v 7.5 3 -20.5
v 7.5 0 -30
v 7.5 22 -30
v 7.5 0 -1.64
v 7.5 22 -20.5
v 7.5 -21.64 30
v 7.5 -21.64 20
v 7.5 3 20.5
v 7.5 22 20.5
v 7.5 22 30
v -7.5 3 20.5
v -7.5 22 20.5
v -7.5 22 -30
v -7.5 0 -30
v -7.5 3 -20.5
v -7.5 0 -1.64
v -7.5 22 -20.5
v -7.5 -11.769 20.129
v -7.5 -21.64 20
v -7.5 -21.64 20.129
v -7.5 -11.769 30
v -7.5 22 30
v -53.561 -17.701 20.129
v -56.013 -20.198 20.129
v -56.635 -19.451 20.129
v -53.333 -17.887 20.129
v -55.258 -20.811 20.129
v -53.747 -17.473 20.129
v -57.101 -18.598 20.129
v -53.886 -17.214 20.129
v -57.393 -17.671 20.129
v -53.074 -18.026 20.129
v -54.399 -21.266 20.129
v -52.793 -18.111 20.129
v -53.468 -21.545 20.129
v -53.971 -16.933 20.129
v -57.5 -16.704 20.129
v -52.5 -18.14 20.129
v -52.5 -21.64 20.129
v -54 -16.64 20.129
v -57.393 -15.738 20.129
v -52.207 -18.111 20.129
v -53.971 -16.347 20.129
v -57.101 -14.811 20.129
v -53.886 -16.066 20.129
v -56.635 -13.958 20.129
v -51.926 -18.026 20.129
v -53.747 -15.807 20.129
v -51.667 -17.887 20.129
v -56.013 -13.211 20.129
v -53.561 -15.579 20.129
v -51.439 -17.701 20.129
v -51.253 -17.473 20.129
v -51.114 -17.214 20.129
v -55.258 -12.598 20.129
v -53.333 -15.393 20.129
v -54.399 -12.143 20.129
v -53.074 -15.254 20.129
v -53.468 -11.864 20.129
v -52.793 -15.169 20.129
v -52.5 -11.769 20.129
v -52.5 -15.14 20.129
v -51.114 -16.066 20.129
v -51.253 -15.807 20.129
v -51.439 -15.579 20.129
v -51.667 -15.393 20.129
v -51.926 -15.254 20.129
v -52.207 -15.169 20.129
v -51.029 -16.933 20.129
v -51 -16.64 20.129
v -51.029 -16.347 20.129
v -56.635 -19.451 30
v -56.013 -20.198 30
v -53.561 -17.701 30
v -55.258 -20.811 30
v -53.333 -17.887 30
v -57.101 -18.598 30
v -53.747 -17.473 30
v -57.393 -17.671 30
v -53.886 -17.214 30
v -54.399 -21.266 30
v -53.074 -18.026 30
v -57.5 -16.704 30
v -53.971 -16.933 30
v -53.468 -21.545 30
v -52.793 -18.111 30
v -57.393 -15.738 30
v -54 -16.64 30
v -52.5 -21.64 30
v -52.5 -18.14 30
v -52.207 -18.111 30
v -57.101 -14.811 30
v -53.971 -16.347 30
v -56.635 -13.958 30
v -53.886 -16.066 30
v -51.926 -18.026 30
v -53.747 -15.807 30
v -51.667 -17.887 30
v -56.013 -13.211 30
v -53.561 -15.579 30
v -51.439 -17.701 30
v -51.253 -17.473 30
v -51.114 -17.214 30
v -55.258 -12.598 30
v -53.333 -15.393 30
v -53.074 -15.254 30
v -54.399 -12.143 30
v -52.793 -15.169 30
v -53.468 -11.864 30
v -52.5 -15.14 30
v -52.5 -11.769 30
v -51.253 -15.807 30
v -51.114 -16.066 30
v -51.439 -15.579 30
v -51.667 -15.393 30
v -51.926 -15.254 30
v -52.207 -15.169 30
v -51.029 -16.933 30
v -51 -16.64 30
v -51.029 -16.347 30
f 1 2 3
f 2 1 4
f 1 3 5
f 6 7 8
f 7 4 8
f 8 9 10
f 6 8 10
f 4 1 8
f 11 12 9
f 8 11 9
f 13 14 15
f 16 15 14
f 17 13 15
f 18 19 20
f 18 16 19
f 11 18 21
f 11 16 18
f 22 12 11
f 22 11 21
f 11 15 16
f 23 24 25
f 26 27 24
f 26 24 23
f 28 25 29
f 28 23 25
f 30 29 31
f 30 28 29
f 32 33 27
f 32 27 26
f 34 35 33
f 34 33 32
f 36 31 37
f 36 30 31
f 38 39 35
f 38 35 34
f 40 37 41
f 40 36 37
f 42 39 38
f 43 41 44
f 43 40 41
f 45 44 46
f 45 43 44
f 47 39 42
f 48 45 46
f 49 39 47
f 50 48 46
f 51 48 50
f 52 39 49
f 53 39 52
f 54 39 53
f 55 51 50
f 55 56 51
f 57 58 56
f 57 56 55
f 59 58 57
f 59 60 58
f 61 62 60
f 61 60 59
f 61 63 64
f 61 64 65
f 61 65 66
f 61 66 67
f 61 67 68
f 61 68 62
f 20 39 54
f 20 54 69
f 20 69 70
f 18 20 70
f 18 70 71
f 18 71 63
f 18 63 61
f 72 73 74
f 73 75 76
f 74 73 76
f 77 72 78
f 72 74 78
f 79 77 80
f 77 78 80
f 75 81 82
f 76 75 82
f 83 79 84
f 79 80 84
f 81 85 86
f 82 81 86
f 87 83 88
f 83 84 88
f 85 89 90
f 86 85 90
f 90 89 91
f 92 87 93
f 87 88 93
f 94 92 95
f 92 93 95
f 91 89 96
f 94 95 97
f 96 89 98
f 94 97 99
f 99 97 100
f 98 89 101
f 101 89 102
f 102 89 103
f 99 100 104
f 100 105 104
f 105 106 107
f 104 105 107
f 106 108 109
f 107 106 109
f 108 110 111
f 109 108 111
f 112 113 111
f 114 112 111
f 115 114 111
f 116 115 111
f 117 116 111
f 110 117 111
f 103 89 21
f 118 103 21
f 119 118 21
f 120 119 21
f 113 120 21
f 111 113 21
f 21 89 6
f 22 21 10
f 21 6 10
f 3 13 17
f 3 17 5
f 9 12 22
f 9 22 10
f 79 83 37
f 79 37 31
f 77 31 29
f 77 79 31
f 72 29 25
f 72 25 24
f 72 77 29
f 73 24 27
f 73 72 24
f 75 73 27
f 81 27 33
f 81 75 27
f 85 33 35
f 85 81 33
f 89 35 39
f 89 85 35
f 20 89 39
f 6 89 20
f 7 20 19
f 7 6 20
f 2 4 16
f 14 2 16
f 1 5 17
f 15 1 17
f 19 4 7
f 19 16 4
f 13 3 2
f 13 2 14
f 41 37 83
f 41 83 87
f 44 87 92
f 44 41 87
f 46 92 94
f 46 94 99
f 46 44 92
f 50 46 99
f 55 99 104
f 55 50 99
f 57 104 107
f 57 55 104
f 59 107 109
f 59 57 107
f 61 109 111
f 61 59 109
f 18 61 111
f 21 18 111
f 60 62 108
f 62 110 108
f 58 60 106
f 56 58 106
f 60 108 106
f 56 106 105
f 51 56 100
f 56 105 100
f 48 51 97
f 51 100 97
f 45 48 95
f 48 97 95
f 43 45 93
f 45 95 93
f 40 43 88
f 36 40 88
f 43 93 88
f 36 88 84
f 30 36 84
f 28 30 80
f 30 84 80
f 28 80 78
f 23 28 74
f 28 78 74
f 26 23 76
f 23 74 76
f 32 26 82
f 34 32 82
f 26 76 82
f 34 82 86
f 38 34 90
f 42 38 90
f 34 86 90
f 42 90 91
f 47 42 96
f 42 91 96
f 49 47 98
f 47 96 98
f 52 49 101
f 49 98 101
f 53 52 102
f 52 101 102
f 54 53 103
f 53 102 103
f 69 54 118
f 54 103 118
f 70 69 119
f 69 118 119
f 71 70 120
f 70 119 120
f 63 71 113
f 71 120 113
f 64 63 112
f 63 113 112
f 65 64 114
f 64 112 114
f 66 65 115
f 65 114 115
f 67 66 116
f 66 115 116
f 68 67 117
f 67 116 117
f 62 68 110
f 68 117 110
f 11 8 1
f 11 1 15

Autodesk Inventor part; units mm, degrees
ref_plane "YZ Plane" through (0, 0, 0) normal (1, 0, 0) x (0, 1, 0)
ref_plane "XZ Plane" through (0, 0, 0) normal (0, 1, 0) x (-1, 0, 0)
ref_plane "XY Plane" through (0, 0, 0) normal (0, 0, 1) x (1, 0, 0)
sketch "Sketch1" plane through (0, 0, 0) normal (0, 1, 0) x (-1, 0, 0)
  line L0 (-7.5, -30) -> (7.5, -30)
  line L1 (7.5, -30) -> (7.5, 30)
  line L2 (7.5, 30) -> (-7.5, 30)
  line L3 (-7.5, 30) -> (-7.5, -30)
  line L4 (-7.5, -30) -> (7.5, 30) construction
  line L5 (7.5, -30) -> (-7.5, 30) construction
  point P0 (0, 0)
  dimension "d0" = 15
  dimension "d1" = 60
extrude "Extrusion1" add sketch "Sketch1" along normal blind 3
sketch "Sketch2" plane through (0, 3, 0) normal (0, 1, 0) x (1, 0, 0)
  line L0 (-7.5, 30) -> (-7.5, -30) projected
  line L1 (7.5, 20.5) -> (-7.5, 20.5)
  line L2 (-7.5, 20.5) -> (-7.5, -20.5)
  line L3 (-7.5, -20.5) -> (7.5, -20.5)
  line L4 (7.5, -20.5) -> (7.5, 20.5)
  line L5 (7.5, 20.5) -> (-7.5, -20.5) construction
  line L6 (-7.5, 20.5) -> (7.5, -20.5) construction
  line L7 (7.5, -20.5) -> (-7.5, -20.5)
  line L8 (-7.5, -20.5) -> (-7.5, -30)
  line L9 (-7.5, -30) -> (7.5, -30)
  line L10 (7.5, -30) -> (7.5, -20.5)
  line L11 (7.5, 30) -> (-7.5, 30) projected
  line L12 (7.5, 20.5) -> (-7.5, 20.5)
  line L13 (-7.5, 20.5) -> (-7.5, 30)
  line L14 (-7.5, 30) -> (7.5, 30)
  line L15 (7.5, 30) -> (7.5, 20.5)
  point P0 (0, 0)
  dimension "d4" = 41
extrude "Extrusion2" add sketch "Sketch2" along normal blind 19 contours L11 L15 L1 L0 | L3 L10 L9 L0
sketch "Sketch3" plane through (-7.5, 0, -30) normal (-1, 0, 0) x (0, 0, 1)
  line L0 (60, 0) -> (0, 0) projected
  line L1 (60, 0) -> (50, 0)
  line L2 (50, 0) -> (50, -21.64)
  line L3 (50, -21.64) -> (60, -21.64)
  line L4 (60, -21.64) -> (60, 0)
  point P0 (30, 0)
  dimension "d7" = 10
  dimension "d8" = 21.64
extrude "Extrusion3" add sketch "Sketch3" against normal blind 15
sketch "Sketch5" plane through (-7.5, 0, -30) normal (-1, 0, 0) x (0, 0, 1)
  line L0 (0, 0) -> (50, 0) projected
  line L1 (28.3595, 0) -> (50, -21.6405)
  line L2 (50, -21.64) -> (50, 0) projected
  line L3 (28.3595, 0) -> (58.9638, 0) construction
  line L4 (50, -21.6405) -> (50, 0)
  line L5 (50, 0) -> (28.3595, 0)
  point P0 (30, 0)
  dimension "d15" = 45
extrude "Extrusion5" add sketch "Sketch5" against normal blind 15
sketch "Sketch6" plane through (-7.5, 0, -30) normal (-1, 0, 0) x (0, 0, 1)
  line L0 (60, -21.64) -> (60, 22) projected
  line L1 (60, -21.64) -> (50.1294, -21.64)
  line L2 (50.1294, -21.64) -> (50.1294, -11.769)
  line L3 (50.1294, -11.769) -> (60, -11.769)
  line L4 (60, -11.769) -> (60, -21.64)
  point P0 (30, 0)
  dimension "d18" = 9.871
extrude "Extrusion6" add sketch "Sketch6" along normal blind 50
sketch "Sketch7" plane through (-7.5, 22, 30) normal (0, 0, 1) x (1, 0, 0)
  point P0 (7.5, -22)
fillet "Fillet1" radius 5 2 edges at (-57.5, -21.64, 25.0647) (-57.5, -11.769, 25.0647)
sketch "Sketch8" plane through (-7.5, -21.64, 20.1294) normal (0, 0, -1) x (-1, 0, 0)
  arc A0 (45, 0) -> (50, 5) centre (45, 5) ccw projected
  point P0 (-7.5, 21.64)
hole "Hole1" at (-52.5, -16.64, 20.1294) direction (0, 0, 1) diameter 3 end through all
properties part number "TurretServoSupport" material "PC/ABS Plastic"
